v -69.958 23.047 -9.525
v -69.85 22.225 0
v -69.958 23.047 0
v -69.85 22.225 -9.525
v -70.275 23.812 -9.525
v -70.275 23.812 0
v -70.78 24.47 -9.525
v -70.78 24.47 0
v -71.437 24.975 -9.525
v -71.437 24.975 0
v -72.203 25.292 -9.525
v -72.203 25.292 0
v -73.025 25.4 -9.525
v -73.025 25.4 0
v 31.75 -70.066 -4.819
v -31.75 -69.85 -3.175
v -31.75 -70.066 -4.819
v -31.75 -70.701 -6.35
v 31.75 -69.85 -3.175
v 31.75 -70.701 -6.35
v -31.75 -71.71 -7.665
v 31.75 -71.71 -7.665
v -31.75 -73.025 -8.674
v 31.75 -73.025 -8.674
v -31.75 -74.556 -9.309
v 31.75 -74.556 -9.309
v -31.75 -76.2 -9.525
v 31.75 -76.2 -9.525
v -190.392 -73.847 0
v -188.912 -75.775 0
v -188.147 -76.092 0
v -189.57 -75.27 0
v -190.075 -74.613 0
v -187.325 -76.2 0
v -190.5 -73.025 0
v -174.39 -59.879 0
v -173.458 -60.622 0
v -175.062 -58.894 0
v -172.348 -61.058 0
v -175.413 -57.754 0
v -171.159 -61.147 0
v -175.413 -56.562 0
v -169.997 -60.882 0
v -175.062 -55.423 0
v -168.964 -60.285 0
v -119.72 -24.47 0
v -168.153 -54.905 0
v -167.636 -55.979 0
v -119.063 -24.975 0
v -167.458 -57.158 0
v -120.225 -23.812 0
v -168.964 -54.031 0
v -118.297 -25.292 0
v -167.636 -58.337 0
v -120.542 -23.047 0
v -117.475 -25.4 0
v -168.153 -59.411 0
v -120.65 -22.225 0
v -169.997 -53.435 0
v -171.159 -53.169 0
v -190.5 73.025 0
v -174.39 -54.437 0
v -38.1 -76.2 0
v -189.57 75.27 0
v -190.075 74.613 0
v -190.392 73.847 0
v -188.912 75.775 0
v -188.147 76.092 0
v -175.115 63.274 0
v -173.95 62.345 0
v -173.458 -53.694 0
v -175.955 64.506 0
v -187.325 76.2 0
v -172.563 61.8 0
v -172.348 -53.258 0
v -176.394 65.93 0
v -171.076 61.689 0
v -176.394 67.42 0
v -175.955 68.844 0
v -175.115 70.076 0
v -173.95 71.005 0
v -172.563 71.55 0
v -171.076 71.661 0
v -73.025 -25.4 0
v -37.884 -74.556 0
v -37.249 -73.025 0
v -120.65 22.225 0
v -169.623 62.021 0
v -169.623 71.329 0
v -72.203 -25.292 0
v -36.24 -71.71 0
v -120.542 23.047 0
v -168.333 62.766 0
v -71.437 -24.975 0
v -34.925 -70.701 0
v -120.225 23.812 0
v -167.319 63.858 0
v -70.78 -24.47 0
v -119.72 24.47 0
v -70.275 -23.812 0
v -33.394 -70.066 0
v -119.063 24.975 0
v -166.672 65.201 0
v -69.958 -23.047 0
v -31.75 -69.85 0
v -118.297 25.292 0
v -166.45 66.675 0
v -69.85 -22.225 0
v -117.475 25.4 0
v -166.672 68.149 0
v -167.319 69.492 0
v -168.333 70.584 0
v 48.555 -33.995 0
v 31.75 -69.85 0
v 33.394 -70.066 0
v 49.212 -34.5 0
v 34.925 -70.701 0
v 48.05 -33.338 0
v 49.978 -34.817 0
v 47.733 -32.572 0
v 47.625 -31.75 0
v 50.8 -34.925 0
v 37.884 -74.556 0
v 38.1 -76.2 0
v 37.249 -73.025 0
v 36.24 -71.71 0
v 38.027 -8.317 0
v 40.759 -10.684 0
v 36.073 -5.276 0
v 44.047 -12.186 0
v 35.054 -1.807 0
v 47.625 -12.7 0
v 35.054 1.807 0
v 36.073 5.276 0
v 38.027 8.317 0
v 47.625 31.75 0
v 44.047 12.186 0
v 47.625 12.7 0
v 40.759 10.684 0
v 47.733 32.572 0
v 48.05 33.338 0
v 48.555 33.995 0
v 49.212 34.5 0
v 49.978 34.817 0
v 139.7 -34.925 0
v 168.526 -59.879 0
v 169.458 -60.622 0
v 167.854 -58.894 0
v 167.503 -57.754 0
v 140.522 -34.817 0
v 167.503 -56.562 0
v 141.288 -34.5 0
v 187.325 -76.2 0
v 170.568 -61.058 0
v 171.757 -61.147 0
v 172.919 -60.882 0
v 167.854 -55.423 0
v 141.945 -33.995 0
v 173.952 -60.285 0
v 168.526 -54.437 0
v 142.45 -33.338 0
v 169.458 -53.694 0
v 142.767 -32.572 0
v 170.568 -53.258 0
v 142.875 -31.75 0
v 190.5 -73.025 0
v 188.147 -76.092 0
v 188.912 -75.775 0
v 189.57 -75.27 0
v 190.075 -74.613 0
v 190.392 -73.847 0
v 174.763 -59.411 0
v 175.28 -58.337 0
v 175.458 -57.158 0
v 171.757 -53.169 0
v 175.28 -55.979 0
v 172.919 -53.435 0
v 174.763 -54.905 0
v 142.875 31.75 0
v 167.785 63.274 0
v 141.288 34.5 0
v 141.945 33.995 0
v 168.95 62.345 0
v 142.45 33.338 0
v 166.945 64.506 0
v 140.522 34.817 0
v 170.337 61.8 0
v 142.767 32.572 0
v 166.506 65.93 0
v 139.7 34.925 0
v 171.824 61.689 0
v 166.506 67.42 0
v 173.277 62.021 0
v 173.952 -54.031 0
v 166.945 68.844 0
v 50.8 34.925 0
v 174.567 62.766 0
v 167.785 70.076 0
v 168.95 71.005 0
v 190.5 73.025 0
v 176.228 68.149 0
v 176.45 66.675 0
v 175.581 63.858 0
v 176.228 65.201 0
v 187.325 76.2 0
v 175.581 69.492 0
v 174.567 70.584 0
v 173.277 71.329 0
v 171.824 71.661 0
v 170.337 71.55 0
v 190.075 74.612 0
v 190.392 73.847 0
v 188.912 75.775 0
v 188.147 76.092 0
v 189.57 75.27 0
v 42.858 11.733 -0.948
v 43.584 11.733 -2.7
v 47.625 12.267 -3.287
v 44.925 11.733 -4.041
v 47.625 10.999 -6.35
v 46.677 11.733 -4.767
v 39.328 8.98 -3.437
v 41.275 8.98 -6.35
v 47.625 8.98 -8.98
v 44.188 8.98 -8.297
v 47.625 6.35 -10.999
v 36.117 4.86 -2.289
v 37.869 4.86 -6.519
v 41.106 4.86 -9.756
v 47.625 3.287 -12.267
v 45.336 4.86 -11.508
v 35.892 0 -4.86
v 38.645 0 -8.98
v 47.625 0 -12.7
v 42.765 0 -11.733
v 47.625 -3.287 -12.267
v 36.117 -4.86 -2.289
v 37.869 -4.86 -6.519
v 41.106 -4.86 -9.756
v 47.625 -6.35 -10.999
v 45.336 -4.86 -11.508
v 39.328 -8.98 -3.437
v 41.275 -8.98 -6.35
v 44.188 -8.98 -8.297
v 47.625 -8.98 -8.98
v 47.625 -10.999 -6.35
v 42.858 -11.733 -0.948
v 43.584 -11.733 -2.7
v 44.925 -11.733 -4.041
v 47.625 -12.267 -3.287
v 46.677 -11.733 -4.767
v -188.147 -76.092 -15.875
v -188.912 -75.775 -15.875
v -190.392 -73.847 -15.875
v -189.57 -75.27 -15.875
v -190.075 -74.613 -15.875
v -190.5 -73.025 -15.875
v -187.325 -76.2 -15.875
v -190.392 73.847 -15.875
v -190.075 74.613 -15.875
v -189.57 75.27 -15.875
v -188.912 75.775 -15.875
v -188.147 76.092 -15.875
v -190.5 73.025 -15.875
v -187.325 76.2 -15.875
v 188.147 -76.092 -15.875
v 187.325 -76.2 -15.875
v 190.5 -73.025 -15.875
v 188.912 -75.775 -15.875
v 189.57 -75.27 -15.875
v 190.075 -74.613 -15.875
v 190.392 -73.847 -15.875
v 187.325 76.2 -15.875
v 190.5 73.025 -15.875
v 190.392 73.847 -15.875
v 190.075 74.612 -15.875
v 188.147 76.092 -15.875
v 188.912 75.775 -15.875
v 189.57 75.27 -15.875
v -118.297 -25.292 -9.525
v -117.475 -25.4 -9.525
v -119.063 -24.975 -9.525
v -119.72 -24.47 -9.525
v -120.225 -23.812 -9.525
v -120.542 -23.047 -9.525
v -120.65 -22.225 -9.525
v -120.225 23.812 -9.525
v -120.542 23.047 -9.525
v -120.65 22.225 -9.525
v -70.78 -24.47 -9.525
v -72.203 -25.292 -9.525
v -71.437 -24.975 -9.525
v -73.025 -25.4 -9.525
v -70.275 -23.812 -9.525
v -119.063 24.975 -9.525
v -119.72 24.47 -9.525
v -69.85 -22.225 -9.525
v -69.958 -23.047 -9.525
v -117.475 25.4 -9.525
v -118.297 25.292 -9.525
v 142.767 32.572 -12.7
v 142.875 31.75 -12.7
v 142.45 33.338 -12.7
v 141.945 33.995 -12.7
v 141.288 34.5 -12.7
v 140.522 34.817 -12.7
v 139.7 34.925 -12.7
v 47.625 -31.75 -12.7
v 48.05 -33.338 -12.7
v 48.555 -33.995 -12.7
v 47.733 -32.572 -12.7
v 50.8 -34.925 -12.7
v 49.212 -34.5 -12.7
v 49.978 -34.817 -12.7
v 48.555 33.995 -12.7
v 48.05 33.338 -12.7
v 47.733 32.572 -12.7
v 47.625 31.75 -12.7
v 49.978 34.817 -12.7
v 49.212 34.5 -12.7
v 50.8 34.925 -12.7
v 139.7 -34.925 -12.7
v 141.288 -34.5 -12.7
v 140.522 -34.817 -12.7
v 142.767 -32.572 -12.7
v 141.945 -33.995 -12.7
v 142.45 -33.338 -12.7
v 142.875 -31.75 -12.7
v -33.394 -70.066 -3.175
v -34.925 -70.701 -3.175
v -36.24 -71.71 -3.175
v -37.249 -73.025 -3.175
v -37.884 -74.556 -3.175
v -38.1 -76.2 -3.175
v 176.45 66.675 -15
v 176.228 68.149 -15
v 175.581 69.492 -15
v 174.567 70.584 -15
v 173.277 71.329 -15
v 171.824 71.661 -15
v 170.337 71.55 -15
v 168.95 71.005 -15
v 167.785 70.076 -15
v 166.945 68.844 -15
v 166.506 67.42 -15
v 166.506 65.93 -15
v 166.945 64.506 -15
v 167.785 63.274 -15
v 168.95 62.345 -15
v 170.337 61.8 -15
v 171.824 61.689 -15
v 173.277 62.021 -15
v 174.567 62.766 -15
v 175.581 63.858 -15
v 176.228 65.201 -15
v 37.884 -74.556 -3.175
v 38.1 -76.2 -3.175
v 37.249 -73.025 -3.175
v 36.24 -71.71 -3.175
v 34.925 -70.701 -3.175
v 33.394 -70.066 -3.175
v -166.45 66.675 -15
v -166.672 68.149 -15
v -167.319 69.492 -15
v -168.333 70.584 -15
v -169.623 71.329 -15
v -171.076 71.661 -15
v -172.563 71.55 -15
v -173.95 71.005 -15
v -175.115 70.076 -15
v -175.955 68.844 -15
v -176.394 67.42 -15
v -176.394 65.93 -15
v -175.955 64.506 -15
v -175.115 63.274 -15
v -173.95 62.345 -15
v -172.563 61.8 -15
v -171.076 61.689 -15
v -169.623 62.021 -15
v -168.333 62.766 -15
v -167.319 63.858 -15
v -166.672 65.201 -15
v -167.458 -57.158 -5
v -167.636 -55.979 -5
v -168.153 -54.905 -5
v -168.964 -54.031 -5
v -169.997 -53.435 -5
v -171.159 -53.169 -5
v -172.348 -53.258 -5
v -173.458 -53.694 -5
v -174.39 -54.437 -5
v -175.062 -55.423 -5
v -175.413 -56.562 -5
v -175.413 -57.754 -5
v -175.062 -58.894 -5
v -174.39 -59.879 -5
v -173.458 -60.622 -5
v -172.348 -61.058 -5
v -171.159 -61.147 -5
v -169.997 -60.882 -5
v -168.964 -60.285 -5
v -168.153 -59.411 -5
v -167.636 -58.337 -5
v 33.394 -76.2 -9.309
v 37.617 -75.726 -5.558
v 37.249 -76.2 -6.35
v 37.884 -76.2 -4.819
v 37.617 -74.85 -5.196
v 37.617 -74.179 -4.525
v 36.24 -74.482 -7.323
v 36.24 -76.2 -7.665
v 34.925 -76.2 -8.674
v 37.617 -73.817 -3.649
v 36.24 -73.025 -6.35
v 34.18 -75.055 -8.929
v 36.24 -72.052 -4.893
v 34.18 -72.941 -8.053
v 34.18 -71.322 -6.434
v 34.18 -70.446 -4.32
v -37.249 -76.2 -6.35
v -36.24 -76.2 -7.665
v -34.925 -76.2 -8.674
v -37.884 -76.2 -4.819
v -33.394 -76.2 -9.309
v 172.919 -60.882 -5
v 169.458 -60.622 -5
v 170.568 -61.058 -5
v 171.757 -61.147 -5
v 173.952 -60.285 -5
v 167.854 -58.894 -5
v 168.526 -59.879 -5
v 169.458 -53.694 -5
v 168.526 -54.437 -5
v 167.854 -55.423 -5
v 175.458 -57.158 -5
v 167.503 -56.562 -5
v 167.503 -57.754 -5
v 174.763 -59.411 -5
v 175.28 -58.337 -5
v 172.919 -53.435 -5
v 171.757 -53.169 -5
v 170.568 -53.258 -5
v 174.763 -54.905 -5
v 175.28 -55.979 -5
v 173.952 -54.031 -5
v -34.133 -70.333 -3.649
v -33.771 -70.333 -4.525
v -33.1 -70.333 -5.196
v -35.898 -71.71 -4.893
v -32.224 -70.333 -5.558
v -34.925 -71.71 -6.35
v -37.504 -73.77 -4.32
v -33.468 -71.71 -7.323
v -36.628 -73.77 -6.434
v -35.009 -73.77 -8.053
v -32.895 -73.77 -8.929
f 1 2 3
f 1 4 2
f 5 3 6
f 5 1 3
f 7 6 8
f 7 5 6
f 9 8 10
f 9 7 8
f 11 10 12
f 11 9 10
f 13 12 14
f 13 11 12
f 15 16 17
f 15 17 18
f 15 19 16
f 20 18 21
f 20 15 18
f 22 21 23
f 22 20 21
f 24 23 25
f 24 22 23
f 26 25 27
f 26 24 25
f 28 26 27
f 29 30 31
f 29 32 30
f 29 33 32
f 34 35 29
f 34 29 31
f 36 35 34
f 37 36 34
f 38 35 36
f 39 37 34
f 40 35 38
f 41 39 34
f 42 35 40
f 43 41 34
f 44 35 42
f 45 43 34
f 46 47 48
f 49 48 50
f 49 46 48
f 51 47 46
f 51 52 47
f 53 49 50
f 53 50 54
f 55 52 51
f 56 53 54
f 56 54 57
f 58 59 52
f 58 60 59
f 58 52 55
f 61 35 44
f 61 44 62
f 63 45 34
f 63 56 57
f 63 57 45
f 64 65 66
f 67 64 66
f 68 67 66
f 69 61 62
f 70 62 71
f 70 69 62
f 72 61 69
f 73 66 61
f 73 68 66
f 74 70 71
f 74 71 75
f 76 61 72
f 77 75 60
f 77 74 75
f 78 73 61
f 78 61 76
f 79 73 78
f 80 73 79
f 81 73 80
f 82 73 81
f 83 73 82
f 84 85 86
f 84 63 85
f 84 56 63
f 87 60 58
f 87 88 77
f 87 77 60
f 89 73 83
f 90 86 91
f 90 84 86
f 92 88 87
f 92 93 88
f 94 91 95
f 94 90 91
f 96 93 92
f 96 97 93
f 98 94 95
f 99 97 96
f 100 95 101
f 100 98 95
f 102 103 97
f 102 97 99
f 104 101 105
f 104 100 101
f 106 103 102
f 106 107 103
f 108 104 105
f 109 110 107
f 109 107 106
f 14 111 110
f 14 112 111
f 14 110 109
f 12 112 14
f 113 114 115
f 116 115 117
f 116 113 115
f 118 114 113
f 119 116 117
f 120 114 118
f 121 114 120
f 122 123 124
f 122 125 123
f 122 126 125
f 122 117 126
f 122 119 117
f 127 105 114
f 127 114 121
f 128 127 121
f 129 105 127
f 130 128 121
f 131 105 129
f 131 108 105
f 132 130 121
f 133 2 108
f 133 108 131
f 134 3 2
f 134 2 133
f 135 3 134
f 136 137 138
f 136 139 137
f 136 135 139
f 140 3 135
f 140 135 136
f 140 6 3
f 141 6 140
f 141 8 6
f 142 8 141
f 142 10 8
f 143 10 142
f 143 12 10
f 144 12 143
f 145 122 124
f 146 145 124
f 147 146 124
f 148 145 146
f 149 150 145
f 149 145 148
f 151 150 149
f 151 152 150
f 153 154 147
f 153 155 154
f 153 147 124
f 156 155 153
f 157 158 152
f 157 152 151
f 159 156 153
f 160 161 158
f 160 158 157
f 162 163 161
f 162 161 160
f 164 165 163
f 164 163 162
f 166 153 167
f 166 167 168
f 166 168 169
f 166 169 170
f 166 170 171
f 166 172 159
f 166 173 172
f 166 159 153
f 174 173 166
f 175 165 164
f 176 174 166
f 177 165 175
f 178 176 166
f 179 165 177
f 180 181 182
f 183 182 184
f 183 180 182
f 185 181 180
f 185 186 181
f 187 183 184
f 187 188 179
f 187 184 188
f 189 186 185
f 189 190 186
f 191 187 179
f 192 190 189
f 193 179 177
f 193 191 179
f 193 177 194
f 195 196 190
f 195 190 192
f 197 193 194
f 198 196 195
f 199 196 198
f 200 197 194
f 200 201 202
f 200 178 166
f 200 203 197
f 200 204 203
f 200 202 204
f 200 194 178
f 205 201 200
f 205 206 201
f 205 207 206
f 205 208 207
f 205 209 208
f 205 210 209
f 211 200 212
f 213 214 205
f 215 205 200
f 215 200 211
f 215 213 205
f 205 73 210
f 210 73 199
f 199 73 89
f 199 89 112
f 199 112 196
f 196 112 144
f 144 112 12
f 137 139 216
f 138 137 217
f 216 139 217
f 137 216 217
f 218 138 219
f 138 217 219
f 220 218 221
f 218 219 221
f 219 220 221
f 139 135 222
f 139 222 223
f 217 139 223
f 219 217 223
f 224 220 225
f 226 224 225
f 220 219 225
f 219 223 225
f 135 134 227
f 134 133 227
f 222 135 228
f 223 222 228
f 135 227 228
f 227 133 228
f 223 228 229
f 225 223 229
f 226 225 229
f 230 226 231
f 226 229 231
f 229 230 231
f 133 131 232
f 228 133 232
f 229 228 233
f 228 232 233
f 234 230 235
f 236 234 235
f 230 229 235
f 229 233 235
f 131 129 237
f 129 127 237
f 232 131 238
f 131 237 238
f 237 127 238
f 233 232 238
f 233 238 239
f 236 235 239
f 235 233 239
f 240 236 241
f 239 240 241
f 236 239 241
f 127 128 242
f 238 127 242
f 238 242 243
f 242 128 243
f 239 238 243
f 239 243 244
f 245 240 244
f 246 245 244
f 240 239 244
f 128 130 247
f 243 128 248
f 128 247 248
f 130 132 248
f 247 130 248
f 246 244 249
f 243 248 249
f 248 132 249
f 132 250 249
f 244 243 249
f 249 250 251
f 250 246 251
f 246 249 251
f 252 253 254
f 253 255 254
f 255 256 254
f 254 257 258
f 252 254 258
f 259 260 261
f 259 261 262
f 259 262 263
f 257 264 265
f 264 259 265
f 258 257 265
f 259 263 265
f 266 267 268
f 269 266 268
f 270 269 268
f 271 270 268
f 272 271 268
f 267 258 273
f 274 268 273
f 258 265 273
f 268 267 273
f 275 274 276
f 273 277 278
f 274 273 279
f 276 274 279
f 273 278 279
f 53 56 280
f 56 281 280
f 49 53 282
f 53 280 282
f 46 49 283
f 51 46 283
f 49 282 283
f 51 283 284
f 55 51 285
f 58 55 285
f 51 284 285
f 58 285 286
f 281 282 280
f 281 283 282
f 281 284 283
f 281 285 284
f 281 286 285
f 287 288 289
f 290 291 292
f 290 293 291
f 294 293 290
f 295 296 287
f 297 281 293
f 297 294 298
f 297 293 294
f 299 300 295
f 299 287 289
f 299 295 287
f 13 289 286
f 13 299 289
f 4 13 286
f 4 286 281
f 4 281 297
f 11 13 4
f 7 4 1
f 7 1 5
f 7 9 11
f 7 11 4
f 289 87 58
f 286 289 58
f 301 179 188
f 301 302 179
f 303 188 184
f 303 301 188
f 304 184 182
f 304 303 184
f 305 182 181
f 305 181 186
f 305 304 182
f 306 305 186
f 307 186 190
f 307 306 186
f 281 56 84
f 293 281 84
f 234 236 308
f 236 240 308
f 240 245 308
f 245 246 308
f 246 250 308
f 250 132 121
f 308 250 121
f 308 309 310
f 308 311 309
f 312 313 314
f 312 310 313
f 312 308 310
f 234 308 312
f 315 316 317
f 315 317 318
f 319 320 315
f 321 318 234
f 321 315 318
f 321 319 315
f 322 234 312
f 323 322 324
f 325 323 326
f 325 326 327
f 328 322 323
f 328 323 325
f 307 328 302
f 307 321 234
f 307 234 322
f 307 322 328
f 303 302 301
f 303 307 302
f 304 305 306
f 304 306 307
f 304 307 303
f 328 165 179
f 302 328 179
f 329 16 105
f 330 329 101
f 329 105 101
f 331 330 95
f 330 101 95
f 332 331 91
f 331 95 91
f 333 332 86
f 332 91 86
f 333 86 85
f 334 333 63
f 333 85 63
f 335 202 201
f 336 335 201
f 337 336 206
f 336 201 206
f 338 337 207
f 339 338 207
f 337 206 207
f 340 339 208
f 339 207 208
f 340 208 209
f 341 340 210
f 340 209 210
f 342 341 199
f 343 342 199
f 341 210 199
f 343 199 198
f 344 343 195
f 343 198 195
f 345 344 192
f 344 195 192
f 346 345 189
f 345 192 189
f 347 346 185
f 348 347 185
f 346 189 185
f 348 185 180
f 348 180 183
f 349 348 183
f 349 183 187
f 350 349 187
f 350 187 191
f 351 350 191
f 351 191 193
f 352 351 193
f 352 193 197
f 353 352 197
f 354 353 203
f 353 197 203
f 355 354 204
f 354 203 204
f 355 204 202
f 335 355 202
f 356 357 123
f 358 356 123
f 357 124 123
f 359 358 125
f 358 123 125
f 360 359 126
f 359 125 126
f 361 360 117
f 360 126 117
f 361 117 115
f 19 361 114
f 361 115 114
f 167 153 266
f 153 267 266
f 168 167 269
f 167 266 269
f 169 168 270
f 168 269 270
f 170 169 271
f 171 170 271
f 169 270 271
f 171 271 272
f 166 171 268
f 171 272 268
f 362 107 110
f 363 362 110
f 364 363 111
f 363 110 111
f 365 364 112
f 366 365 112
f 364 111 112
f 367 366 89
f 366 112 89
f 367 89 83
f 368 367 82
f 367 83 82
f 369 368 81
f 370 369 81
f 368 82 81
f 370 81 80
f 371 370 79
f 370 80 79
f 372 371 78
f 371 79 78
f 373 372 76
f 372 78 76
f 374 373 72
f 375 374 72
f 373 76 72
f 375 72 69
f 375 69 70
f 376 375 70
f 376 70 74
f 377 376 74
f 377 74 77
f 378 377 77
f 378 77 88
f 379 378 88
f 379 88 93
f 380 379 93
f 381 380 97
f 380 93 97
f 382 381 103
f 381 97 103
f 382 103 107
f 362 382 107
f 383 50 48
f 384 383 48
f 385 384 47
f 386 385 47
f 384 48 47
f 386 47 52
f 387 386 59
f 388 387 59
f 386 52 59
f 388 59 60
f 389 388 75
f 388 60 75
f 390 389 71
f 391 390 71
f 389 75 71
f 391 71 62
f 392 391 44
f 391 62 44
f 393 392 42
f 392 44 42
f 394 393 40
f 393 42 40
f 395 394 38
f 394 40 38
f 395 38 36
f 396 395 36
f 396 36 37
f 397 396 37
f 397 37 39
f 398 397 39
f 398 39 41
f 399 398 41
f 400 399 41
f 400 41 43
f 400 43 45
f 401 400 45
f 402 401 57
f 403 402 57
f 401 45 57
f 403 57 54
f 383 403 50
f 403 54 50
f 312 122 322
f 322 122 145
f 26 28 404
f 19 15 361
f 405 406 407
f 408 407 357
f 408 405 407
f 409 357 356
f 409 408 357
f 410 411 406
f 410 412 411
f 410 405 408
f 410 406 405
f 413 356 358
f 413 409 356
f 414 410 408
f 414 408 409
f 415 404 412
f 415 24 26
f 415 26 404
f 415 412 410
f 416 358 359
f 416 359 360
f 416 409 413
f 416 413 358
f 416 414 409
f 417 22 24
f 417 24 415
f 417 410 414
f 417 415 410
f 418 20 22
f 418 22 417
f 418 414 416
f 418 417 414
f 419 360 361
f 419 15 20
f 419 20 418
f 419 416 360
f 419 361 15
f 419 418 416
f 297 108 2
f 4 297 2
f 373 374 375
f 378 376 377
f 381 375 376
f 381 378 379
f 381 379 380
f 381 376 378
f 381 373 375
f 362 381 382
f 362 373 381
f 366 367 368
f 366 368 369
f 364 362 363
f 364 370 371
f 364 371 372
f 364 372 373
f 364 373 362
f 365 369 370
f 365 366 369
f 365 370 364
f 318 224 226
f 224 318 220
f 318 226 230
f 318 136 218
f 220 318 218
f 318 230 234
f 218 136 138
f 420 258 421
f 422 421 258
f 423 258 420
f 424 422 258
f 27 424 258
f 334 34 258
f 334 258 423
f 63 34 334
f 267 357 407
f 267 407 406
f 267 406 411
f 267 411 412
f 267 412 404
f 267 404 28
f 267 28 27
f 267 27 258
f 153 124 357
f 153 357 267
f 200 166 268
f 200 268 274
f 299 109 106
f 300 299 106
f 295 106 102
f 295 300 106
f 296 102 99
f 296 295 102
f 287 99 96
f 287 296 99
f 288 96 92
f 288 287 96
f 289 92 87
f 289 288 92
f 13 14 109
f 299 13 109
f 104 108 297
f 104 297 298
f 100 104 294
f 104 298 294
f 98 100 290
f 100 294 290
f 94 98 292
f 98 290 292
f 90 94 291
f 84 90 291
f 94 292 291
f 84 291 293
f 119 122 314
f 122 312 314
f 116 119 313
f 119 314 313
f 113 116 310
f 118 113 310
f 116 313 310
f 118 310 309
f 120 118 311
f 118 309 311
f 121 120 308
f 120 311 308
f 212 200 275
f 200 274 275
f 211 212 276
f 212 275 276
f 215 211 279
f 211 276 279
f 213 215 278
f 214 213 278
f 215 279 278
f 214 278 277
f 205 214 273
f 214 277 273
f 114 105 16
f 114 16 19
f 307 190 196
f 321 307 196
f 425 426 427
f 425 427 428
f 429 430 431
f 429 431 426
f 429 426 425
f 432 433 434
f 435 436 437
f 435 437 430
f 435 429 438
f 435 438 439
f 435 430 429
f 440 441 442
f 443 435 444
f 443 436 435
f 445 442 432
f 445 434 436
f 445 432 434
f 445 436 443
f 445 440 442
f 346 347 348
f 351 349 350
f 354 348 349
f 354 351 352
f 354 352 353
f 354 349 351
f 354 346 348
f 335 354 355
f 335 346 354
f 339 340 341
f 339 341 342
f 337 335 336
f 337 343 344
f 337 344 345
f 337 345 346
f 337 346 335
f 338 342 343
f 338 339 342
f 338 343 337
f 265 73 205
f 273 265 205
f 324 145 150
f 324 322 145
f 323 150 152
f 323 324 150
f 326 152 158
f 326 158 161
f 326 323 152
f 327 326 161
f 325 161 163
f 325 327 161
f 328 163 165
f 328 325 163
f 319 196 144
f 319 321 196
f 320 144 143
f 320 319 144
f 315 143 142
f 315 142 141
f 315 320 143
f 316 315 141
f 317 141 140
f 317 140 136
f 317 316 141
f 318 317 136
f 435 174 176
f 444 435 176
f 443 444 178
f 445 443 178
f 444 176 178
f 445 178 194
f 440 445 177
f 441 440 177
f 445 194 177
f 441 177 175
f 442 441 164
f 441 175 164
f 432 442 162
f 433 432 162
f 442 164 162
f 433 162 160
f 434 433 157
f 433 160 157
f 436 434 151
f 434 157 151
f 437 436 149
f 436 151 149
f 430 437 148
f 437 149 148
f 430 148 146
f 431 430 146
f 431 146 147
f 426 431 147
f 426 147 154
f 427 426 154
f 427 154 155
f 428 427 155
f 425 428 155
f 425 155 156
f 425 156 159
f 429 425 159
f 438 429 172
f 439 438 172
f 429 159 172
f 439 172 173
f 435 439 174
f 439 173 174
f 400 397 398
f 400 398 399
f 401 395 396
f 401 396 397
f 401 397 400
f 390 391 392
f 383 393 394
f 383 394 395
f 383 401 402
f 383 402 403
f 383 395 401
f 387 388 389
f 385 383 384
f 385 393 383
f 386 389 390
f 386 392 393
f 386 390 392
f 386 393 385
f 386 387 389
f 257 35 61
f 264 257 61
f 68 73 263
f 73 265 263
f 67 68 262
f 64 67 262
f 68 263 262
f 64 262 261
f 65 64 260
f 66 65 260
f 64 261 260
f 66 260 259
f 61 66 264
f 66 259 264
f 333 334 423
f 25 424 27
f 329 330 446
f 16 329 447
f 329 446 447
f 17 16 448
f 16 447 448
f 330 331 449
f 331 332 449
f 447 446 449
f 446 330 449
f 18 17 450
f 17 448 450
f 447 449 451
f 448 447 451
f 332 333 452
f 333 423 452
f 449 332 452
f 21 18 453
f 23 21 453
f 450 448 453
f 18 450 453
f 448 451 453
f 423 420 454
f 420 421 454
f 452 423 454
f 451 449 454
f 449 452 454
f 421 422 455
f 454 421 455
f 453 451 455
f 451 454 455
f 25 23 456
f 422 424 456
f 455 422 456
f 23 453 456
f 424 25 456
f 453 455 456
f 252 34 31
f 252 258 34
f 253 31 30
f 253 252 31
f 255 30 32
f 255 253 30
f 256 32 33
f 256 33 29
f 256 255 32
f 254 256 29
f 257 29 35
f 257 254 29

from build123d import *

# Parameters (mm, degrees)
F0_W      = 381
F0_H      = 152.4
F1_DEPTH  = 15.875
F3_DEPTH  = 9.525
F4_DEPTH  = 12.7
F5_R      = 3.175
F6_R      = 4
F7_DEPTH  = 5
F8_W      = 76.2
F8_H      = 9.525
F9_DEPTH  = 6.35
F10_R     = 6.34999
F11_R     = 5
F12_DEPTH = 15
F13_R     = 3.175


# Not quite as in the source:
# - a fillet or chamfer is up to 0.001 mm smaller than in the source, because OpenCascade refuses the exact size
# - ends of sketch curves that miss each other by under 0.0002 mm in the source are joined


with BuildPart() as f1:
    # F0 (on Top) → F1 (new body)
    with BuildSketch(Plane.XY):
        Rectangle(F0_W, F0_H)
    extrude(amount=-F1_DEPTH)

    # F2 (on face) → F3 (cut)
    with BuildSketch(Plane.XY):
        Polygon((-69.85, -25.4), (-69.85, 0), (-69.85, 25.4), (-120.65, 25.4), (-120.65, -25.4), align=None)
    extrude(amount=-F3_DEPTH, mode=Mode.SUBTRACT)

    # F2 (on face) → F4 (cut)
    with BuildSketch(Plane.XY):
        Polygon((47.625, 0), (47.625, -34.925), (142.875, -34.925), (142.875, 34.925), (47.625, 34.925), align=None)
    extrude(amount=-F4_DEPTH, mode=Mode.SUBTRACT)

    # F5
    f5_edges = [f1.edges().sort_by_distance(p)[0] for p in [
        (-69.85, 25.4, -4.7625),
        (142.875, 34.925, -6.35),
        (-69.85, -25.4, -4.7625),
        (142.875, -34.925, -6.35),
        (-120.65, -25.4, -4.7625),
        (47.625, -34.925, -6.35),
        (47.625, 34.925, -6.35),
        (-120.65, 25.4, -4.7625),
    ]]
    fillet(f5_edges, radius=F5_R)

    # F6 (on face) → F7 (cut)
    with BuildSketch(Plane.XY):
        with Locations((-171.4581174665, -57.1581174665)):
            Circle(F6_R)
        with Locations((171.4581174665, -57.1581174665)):
            Circle(F6_R)
    extrude(amount=-F7_DEPTH, mode=Mode.SUBTRACT)

    # F8 (on face) → F9 (cut)
    with BuildSketch(Plane.XZ.offset(76.2)):
        with Locations((0, -4.7625)):
            Rectangle(F8_W, F8_H)
    extrude(amount=-F9_DEPTH, mode=Mode.SUBTRACT)

    # F10 (radius 6.35 in the source; OpenCascade refuses exactly that, so slightly less here)
    f10_edges = [f1.edges().sort_by_distance(p)[0] for p in [
        (-38.1, -73.025, -9.525),
        (-38.1, -69.85, -4.7625),
        (0, -69.85, -9.525),
        (38.1, -73.025, -9.525),
        (38.1, -69.85, -4.7625),
    ]]
    fillet(f10_edges, radius=F10_R)

    # F11 (on face) → F12 (cut)
    with BuildSketch(Plane.XY):
        with Locations((-171.45, 66.675)):
            Circle(F11_R)
        with Locations((171.45, 66.675)):
            Circle(F11_R)
    extrude(amount=-F12_DEPTH, mode=Mode.SUBTRACT)

    # F13
    f13_edges = [f1.edges().sort_by_distance(p)[0] for p in [
        (-190.5, -76.2, -7.9375),
        (190.5, -76.2, -7.9375),
        (190.5, 76.2, -7.9375),
        (-190.5, 76.2, -7.9375),
    ]]
    fillet(f13_edges, radius=F13_R)

    # F14 (on face) → F15 (revolve, cut)
    with BuildSketch(Plane.XY):
        with BuildLine():
            Line((47.625, -12.7), (47.625, 12.7))
            ThreePointArc((47.625, 12.7), (34.925, 1.535e-07), (47.625, -12.7))
        make_face()
    revolve(axis=Axis((47.625, 0, 0), (0, -1, 0)), mode=Mode.SUBTRACT)


solid = f1.part
